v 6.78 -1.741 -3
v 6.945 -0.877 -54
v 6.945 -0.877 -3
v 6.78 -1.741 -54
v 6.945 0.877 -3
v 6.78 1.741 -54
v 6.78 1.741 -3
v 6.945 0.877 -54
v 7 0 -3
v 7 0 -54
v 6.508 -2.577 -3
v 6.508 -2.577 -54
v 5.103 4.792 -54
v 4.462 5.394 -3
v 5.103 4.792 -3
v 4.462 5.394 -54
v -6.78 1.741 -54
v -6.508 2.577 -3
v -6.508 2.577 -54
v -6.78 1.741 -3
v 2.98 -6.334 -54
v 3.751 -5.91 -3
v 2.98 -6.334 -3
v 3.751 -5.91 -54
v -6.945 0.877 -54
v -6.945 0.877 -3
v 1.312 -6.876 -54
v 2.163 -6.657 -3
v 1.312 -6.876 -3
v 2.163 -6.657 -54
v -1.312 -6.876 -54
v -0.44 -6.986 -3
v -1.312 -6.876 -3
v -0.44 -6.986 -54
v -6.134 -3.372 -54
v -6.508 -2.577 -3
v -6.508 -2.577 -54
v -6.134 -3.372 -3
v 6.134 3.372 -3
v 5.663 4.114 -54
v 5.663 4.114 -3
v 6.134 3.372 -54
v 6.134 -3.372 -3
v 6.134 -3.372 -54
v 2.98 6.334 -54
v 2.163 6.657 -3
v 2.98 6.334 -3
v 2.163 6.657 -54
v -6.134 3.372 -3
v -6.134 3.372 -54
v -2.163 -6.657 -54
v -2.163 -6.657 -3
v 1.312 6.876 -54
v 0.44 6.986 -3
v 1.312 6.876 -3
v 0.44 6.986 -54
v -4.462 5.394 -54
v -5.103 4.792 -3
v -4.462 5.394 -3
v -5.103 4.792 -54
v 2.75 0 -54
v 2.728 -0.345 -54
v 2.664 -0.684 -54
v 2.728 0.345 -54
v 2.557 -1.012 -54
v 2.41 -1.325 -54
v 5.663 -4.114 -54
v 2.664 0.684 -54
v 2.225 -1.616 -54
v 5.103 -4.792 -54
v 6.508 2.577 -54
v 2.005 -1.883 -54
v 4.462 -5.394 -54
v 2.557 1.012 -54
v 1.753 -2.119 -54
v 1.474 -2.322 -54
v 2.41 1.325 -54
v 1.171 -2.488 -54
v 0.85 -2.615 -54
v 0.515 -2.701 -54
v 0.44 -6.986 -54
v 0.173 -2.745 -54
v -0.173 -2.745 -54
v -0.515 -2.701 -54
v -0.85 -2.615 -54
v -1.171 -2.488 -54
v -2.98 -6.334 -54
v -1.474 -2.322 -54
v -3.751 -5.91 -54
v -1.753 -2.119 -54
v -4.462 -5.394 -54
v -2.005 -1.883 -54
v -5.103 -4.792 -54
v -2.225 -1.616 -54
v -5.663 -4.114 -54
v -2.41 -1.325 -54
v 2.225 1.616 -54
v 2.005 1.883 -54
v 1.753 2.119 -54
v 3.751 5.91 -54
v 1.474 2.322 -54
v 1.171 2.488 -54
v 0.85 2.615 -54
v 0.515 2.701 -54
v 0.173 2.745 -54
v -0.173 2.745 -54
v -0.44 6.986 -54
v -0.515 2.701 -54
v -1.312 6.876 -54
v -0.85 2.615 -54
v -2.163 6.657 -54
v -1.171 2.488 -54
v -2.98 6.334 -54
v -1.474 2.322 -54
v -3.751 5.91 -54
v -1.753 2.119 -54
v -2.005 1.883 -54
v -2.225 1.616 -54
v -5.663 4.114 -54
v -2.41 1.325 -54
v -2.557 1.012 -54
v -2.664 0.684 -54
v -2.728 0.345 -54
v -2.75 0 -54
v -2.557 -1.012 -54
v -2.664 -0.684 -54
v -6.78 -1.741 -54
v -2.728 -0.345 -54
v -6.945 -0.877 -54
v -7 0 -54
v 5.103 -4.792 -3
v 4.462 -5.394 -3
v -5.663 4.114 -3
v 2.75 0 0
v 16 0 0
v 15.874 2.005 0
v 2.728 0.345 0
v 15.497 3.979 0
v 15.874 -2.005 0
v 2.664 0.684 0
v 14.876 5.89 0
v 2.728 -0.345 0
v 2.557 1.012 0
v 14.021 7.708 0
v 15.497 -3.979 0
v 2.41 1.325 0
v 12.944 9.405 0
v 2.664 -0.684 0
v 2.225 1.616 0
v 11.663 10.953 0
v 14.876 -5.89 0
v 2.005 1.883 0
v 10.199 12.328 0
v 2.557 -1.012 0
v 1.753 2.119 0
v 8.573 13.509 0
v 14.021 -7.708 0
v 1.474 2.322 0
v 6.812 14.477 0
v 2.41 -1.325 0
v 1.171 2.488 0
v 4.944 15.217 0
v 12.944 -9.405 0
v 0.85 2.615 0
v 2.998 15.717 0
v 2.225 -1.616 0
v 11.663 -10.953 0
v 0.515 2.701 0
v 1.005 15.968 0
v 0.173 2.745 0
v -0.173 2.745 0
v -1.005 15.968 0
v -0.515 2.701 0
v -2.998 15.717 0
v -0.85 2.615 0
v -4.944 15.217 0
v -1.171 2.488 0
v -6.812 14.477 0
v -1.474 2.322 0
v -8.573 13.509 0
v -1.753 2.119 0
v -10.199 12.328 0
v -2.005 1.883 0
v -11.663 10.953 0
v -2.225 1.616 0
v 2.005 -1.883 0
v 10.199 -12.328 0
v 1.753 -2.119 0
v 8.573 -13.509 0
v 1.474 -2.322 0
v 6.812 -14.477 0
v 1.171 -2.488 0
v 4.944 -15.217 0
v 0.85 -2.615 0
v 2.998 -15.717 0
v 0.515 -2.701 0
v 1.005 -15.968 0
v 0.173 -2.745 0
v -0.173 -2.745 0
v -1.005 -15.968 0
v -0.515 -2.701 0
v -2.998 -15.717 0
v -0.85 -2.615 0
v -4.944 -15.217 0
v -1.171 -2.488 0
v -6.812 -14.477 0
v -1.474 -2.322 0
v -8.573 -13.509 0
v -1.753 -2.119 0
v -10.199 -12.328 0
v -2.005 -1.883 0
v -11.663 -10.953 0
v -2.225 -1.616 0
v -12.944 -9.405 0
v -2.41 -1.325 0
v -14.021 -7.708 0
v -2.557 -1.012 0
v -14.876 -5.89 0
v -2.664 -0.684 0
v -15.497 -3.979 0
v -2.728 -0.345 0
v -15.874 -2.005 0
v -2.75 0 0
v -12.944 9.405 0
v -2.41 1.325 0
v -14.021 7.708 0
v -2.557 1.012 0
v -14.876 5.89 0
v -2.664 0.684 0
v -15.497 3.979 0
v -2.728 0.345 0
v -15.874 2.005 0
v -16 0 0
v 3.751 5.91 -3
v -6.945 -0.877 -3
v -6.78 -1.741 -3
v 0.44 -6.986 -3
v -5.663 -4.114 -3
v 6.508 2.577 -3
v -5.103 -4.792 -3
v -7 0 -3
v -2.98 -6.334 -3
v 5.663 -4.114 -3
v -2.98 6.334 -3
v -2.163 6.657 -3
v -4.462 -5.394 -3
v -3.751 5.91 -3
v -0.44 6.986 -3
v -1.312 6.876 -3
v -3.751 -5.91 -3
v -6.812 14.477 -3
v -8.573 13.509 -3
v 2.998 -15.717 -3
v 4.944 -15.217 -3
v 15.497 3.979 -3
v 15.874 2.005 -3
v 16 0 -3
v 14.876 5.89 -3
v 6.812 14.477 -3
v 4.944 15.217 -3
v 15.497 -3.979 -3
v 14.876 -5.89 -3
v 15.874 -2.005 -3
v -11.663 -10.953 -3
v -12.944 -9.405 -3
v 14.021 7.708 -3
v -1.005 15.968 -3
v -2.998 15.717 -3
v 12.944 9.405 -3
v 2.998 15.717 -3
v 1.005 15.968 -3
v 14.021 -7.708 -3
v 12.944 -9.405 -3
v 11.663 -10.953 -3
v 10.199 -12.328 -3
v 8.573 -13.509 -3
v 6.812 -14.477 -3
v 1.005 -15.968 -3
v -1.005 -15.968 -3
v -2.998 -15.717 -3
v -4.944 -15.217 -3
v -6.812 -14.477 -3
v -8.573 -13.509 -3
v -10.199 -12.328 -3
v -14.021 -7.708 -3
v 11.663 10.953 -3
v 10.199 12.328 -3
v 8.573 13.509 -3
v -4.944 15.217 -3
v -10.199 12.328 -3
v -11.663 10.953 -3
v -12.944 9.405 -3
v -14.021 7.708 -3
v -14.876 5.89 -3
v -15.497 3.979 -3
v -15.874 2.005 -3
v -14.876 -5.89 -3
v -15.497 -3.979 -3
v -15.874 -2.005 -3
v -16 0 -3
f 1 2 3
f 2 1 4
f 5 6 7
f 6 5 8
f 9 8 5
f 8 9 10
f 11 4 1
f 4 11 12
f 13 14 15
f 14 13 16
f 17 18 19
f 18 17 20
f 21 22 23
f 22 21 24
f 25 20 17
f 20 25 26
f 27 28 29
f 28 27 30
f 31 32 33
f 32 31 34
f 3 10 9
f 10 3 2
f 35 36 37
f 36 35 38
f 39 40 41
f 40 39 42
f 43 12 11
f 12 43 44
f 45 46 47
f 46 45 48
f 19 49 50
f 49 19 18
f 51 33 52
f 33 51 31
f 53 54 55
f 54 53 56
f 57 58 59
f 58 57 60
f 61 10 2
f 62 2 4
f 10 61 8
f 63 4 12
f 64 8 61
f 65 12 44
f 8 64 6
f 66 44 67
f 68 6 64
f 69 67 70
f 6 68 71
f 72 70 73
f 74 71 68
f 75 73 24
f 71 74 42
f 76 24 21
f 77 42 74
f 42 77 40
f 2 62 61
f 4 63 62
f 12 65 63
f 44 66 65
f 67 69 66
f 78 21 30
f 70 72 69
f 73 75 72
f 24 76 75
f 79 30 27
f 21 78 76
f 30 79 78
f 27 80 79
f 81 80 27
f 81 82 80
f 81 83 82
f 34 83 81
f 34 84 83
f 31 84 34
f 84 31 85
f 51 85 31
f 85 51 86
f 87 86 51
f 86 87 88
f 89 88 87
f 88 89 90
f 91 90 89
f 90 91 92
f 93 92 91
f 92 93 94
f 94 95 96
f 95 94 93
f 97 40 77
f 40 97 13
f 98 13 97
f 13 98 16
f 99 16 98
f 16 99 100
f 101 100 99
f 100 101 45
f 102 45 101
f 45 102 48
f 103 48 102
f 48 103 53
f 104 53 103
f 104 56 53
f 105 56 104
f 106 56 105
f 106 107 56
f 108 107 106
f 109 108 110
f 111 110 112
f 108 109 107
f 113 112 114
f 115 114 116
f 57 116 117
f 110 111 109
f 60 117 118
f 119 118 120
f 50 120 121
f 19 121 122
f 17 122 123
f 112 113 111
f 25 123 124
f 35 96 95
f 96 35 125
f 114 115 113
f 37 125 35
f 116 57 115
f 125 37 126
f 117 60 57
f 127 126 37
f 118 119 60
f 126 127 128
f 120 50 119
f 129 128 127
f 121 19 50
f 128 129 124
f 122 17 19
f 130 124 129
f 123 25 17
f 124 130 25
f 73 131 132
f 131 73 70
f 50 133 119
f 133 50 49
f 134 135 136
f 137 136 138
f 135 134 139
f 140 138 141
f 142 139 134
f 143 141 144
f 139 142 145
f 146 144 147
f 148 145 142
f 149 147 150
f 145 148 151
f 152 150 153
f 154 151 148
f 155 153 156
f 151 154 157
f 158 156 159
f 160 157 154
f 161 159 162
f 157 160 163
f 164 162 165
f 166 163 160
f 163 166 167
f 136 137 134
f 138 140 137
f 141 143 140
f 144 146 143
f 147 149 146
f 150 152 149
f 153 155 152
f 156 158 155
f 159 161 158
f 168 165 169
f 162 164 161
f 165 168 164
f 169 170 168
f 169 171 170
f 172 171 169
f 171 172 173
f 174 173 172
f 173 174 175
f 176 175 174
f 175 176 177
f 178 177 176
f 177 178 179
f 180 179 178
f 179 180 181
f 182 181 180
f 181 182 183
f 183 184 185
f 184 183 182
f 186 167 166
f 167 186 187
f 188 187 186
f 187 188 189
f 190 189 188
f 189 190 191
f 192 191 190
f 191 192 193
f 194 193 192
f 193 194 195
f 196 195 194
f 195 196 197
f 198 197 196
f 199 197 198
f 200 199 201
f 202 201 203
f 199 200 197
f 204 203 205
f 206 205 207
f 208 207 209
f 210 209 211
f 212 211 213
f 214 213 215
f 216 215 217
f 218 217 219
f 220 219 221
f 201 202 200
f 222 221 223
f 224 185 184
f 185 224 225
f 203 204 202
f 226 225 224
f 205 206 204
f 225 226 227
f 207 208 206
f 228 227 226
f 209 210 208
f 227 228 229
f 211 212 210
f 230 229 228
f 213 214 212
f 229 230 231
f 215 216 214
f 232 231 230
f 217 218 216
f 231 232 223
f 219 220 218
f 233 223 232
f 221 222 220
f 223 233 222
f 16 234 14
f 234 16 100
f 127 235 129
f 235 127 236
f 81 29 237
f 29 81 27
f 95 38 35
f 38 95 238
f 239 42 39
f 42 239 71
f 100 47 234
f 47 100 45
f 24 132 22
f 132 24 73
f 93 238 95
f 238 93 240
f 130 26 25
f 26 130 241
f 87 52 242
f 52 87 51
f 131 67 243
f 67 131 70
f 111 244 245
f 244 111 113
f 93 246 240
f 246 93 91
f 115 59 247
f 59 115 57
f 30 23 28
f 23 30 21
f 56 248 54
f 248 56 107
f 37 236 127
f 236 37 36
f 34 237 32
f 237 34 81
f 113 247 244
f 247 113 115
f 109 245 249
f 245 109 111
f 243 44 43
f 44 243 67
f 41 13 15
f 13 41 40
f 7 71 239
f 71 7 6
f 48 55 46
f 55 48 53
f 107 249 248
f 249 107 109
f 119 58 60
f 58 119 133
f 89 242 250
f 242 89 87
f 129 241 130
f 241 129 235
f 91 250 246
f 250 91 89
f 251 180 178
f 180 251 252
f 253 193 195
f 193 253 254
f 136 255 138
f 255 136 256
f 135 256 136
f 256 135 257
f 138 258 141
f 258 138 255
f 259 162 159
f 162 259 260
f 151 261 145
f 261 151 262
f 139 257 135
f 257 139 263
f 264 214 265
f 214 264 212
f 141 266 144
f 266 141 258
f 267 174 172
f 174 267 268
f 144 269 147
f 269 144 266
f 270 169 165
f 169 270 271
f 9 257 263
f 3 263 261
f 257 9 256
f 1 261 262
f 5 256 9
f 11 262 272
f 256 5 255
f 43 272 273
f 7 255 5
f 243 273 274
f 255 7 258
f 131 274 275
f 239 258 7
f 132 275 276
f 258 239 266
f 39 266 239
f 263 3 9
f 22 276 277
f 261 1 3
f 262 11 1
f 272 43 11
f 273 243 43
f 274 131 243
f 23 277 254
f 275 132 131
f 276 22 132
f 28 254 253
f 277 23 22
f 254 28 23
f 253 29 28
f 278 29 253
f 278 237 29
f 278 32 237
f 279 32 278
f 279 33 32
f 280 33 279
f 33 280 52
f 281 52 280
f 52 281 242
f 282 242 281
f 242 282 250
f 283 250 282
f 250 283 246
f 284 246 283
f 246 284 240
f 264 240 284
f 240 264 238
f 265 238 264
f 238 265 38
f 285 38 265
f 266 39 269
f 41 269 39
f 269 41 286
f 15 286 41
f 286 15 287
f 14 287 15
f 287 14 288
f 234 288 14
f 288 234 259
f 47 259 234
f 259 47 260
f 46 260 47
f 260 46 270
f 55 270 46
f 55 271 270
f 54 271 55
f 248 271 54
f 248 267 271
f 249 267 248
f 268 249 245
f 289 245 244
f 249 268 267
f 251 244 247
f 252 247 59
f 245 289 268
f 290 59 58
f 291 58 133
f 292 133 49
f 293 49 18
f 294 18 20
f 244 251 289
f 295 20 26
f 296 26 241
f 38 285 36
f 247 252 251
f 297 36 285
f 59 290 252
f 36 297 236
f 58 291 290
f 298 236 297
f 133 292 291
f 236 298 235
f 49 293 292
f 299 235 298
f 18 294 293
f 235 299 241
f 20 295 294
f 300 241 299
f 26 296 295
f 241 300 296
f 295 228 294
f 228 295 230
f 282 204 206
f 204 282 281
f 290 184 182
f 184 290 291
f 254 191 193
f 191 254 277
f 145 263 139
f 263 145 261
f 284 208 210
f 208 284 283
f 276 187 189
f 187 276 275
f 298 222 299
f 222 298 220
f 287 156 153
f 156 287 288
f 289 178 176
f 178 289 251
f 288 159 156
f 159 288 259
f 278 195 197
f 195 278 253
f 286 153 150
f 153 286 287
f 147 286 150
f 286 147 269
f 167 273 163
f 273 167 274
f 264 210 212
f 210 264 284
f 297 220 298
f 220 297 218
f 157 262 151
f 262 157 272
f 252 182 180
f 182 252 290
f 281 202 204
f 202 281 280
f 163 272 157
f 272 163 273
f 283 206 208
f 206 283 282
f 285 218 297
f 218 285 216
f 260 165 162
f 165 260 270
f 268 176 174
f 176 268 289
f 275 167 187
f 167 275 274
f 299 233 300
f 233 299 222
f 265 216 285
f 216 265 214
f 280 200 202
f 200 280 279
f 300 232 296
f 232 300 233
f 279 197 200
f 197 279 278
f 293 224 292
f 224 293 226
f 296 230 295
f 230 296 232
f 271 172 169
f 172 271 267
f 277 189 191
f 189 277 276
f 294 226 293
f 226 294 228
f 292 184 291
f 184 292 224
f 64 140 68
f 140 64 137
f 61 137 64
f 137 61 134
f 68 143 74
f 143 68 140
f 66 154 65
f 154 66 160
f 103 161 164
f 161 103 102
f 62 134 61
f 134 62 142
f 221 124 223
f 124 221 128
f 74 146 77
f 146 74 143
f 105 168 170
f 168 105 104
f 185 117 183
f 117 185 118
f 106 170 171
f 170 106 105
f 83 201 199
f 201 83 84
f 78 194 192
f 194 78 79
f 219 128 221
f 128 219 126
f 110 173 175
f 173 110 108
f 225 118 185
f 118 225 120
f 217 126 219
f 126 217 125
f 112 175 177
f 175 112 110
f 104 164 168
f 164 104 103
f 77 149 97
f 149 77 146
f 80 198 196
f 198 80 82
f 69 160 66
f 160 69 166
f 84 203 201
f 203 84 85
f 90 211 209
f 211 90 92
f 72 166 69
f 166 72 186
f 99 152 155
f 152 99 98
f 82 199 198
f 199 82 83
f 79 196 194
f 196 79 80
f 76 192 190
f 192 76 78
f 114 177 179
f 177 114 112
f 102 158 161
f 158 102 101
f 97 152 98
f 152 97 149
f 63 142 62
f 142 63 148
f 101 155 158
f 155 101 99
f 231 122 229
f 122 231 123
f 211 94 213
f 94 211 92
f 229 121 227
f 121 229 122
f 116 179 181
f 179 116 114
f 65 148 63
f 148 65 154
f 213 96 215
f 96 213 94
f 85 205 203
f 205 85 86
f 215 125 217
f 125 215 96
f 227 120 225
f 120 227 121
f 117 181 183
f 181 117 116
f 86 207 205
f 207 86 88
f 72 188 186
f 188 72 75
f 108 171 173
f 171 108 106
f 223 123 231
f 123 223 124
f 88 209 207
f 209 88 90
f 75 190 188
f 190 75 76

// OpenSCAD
$fn = 50;


difference() {
	union() {
		translate(v = [0, 0, -54.0000000000]) {
			cylinder(h = 54, r = 7.0000000000);
		}
		translate(v = [0, 0, -3.0000000000]) {
			cylinder(h = 3, r = 16.0000000000);
		}
	}
	union() {
		#translate(v = [0, 0, -54]) {
			cylinder(h = 54, r = 2.7500000000);
		}
	}
}
